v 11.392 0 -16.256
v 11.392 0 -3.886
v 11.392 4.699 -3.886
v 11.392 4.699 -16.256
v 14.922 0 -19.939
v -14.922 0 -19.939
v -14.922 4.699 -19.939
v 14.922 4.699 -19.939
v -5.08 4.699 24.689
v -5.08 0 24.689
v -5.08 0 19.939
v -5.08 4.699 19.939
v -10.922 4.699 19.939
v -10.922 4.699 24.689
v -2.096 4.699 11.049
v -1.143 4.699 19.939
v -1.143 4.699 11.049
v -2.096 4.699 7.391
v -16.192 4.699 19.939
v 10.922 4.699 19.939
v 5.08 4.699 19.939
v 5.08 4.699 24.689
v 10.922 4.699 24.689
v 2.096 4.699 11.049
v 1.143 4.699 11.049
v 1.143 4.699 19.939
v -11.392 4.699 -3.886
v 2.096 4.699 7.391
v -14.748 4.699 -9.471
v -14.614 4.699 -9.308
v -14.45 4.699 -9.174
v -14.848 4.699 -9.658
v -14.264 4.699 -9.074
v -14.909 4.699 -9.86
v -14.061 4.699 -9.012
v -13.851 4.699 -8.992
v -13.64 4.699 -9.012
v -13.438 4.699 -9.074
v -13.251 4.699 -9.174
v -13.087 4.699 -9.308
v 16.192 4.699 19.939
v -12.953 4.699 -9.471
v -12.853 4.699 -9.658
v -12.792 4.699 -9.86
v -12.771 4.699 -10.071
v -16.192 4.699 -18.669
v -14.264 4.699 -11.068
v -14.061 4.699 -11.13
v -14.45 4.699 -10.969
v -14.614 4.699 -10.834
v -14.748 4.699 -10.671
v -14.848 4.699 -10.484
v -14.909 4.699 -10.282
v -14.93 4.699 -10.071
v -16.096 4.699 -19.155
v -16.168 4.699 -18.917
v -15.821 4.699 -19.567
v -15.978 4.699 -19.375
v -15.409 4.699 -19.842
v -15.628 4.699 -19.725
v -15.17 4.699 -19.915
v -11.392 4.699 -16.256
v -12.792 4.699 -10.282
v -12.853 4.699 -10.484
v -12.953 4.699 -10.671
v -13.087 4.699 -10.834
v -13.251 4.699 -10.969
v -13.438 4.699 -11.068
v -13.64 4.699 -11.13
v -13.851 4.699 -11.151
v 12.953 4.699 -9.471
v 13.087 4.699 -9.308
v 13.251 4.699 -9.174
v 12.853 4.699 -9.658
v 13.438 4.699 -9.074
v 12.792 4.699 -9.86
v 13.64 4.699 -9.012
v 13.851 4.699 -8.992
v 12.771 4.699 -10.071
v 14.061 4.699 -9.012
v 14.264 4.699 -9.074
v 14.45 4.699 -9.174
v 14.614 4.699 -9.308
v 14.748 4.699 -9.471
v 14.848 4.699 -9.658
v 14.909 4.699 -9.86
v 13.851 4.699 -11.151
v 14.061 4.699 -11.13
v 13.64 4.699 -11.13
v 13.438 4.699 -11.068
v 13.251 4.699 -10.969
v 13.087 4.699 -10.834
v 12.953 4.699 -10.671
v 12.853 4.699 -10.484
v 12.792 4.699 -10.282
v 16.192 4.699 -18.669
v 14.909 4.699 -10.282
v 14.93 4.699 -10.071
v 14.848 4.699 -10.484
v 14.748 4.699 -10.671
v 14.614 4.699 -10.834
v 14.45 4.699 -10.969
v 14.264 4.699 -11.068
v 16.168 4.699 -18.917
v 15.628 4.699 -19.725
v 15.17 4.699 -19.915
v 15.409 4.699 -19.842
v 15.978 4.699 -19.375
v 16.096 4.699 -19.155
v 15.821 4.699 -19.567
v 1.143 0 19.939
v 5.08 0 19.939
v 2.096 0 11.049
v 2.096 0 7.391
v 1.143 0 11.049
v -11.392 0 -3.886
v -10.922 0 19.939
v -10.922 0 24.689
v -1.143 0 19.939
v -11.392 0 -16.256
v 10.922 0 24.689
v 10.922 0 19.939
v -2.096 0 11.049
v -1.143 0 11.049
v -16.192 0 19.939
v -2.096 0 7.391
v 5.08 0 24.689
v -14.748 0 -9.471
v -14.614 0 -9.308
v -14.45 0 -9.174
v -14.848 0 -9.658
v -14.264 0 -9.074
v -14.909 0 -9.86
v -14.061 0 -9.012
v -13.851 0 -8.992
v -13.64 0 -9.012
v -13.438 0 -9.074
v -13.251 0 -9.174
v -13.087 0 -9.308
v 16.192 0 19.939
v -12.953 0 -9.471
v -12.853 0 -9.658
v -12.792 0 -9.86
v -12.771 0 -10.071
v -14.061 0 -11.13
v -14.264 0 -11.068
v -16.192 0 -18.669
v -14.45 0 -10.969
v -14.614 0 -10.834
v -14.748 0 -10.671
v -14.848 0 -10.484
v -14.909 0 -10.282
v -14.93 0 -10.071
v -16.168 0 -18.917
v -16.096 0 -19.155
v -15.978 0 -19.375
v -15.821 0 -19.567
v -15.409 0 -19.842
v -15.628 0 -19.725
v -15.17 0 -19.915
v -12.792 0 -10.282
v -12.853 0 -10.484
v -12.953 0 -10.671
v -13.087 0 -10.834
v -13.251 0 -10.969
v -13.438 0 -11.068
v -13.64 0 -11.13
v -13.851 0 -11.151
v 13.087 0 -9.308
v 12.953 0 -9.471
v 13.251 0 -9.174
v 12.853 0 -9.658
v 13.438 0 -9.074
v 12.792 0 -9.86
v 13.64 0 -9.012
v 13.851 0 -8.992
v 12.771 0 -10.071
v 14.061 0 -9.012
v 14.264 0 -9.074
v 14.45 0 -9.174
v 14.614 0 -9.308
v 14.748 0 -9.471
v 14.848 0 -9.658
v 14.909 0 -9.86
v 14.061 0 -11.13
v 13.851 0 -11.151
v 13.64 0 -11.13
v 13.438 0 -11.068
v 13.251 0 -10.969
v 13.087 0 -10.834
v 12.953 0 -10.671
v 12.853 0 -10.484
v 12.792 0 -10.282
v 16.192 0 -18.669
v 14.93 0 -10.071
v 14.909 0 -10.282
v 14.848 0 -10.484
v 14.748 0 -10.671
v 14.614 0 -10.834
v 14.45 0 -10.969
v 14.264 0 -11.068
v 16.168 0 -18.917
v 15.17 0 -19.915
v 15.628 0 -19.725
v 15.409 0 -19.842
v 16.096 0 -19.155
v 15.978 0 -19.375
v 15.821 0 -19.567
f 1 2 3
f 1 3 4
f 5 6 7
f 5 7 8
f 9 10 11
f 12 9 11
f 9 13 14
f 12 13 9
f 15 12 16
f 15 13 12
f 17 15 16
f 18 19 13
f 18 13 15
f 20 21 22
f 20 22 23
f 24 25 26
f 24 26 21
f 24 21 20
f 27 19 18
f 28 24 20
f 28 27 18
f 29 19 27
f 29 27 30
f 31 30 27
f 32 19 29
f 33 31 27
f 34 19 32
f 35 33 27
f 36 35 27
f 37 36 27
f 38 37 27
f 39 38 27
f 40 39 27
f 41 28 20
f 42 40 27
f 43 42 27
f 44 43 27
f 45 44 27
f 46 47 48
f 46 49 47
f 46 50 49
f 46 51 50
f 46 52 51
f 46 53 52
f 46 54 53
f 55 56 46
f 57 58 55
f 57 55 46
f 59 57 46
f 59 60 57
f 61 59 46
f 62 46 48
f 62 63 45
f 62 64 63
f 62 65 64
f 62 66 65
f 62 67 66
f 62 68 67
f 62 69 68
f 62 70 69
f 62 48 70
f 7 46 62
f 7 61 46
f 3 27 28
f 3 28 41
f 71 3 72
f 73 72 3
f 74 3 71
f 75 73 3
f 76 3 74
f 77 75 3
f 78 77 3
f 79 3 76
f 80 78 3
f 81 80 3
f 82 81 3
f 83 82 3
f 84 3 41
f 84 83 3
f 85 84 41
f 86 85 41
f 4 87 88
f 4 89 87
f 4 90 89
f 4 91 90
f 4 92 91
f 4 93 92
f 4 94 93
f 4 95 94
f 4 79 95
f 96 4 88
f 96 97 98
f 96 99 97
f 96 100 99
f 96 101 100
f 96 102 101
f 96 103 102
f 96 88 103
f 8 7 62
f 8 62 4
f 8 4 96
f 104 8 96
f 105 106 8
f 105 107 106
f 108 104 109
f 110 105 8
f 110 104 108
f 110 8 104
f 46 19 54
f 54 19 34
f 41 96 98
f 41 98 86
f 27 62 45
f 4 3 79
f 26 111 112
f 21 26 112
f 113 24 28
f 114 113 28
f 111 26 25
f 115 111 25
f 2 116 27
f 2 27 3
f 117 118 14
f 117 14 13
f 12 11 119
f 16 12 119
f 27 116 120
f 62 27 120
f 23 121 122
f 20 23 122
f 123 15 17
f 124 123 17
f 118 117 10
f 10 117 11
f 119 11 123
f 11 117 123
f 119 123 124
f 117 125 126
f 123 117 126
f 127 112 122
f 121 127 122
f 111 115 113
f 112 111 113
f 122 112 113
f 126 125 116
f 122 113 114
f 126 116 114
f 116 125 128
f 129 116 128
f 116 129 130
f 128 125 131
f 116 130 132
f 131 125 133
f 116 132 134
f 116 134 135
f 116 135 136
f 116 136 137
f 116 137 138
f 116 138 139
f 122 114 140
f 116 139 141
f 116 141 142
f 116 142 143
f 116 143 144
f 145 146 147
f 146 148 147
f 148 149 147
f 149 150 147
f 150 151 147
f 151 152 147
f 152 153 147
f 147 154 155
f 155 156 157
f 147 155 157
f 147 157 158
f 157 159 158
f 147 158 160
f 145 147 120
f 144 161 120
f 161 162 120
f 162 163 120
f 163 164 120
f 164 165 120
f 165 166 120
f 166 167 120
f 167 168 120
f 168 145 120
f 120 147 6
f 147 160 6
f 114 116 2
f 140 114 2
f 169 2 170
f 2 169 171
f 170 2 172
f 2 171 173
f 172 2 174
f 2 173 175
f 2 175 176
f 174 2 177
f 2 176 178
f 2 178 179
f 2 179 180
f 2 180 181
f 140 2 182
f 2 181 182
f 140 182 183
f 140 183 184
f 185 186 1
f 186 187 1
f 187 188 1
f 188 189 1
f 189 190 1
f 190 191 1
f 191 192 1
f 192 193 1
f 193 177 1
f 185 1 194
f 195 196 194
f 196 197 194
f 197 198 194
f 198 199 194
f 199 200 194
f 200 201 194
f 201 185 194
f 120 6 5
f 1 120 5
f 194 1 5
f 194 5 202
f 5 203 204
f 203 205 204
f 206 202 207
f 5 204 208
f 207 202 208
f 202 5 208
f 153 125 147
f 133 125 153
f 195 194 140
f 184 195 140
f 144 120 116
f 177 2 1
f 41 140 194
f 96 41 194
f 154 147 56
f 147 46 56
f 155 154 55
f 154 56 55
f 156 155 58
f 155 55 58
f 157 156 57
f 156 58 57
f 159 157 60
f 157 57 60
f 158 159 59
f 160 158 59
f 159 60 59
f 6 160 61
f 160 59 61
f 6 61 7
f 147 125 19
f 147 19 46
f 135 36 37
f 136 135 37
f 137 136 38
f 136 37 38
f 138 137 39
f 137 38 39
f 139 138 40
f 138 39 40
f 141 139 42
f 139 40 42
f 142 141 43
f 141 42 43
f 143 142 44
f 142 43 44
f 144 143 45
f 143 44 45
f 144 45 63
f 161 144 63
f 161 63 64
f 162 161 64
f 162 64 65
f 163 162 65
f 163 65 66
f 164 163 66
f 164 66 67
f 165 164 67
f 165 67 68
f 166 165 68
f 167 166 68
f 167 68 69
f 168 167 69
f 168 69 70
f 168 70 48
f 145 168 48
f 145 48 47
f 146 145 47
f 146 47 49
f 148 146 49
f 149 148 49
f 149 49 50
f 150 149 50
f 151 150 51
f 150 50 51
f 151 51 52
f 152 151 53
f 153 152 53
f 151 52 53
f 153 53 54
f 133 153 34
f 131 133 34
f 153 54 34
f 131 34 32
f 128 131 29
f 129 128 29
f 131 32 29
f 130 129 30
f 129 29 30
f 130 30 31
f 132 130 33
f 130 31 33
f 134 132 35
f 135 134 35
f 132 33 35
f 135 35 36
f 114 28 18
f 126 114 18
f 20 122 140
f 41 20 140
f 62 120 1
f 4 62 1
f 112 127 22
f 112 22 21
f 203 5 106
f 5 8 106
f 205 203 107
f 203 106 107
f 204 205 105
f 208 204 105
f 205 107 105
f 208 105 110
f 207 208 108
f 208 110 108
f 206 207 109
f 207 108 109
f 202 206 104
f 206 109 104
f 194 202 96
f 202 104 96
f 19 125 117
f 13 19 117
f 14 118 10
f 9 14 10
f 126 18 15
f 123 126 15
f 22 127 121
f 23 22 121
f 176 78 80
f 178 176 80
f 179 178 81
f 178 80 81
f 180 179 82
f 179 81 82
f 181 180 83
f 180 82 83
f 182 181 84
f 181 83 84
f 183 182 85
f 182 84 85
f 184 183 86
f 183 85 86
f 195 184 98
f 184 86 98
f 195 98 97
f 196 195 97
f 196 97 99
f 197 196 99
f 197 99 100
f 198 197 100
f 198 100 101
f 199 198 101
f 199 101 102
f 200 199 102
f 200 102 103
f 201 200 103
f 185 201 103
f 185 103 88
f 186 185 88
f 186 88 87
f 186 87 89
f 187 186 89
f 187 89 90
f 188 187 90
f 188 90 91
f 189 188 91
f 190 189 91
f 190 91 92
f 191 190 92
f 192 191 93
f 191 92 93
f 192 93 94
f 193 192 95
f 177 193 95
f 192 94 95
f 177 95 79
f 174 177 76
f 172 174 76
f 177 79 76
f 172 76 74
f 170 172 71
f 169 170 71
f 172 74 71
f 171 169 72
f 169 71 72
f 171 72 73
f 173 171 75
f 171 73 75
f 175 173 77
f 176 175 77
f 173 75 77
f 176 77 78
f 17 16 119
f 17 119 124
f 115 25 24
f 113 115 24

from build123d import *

# Parameters (mm, degrees)
SKETCH1_W           = 32.385
SKETCH1_H           = 39.878
SKETCH1_W_2         = 22.7838
SKETCH1_H_2         = 12.3698
SKETCH1_W_3         = 5.842
SKETCH1_H_3         = 4.7498
BOSS_EXTRUDE1_DEPTH = 4.699
SKETCH2_W           = 1.143
SKETCH2_H           = 8.89
CUT_EXTRUDE1_DEPTH  = 30.896730635
FILLET1_R           = 1.27
SKETCH3_R           = 1.0795
CUT_EXTRUDE2_DEPTH  = 30.896730635


with BuildPart() as part:
    # Sketch1 → Boss-Extrude1 (new body)
    # profile 1 of 3: a face of its own
    with BuildSketch(Plane(origin=(0, 0, 0), x_dir=(1, 0, 0), z_dir=(0, 1, 0))):
        Rectangle(SKETCH1_W, SKETCH1_H)
        with Locations((0, 10.0711)):
            Rectangle(SKETCH1_W_2, SKETCH1_H_2, mode=Mode.SUBTRACT)
    # profile 2 of 3: a face of its own
    with BuildSketch(Plane(origin=(0, 0, 0), x_dir=(1, 0, 0), z_dir=(0, 1, 0))):
        with Locations((-8.001, -22.3139)):
            Rectangle(SKETCH1_W_3, SKETCH1_H_3)
    # profile 3 of 3: a face of its own
    with BuildSketch(Plane(origin=(0, 0, 0), x_dir=(1, 0, 0), z_dir=(0, 1, 0))):
        with Locations((8.001, -22.3139)):
            Rectangle(SKETCH1_W_3, SKETCH1_H_3)
    extrude(amount=BOSS_EXTRUDE1_DEPTH)

    # Sketch2 → Cut-Extrude1 (cut, through all)
    with BuildSketch(Plane(origin=(0, 4.699, 0), x_dir=(1, 0, 0), z_dir=(0, 1, 0))):
        Polygon((-2.0955, -11.049), (-1.143, -11.049), (0, -11.049), (1.143, -11.049), (2.0955, -11.049), (2.0955, -7.3914), (-2.0955, -7.3914), align=None)
        with Locations((0.5715, -15.494)):
            Rectangle(SKETCH2_W, SKETCH2_H)
        with Locations((-0.5715, -15.494)):
            Rectangle(SKETCH2_W, SKETCH2_H)
    extrude(amount=-CUT_EXTRUDE1_DEPTH, mode=Mode.SUBTRACT)

    # Fillet1
    fillet1_edges = [part.edges().sort_by_distance(p)[0] for p in [
        (16.1925, 2.3495, -19.939),
        (-16.1925, 2.3495, -19.939),
    ]]
    fillet(fillet1_edges, radius=FILLET1_R)

    # Sketch3 → Cut-Extrude2 (cut, through all)
    with BuildSketch(Plane(origin=(0, 4.699, 0), x_dir=(1, 0, 0), z_dir=(0, 1, 0))):
        with Locations(Location((13.85062, 10.0711, 0), (0, 0, 270))):
            Circle(SKETCH3_R)
        with Locations(Location((-13.85062, 10.0711, 0), (0, 0, 270))):
            Circle(SKETCH3_R)
    extrude(amount=-CUT_EXTRUDE2_DEPTH, mode=Mode.SUBTRACT)


solid = part.part
